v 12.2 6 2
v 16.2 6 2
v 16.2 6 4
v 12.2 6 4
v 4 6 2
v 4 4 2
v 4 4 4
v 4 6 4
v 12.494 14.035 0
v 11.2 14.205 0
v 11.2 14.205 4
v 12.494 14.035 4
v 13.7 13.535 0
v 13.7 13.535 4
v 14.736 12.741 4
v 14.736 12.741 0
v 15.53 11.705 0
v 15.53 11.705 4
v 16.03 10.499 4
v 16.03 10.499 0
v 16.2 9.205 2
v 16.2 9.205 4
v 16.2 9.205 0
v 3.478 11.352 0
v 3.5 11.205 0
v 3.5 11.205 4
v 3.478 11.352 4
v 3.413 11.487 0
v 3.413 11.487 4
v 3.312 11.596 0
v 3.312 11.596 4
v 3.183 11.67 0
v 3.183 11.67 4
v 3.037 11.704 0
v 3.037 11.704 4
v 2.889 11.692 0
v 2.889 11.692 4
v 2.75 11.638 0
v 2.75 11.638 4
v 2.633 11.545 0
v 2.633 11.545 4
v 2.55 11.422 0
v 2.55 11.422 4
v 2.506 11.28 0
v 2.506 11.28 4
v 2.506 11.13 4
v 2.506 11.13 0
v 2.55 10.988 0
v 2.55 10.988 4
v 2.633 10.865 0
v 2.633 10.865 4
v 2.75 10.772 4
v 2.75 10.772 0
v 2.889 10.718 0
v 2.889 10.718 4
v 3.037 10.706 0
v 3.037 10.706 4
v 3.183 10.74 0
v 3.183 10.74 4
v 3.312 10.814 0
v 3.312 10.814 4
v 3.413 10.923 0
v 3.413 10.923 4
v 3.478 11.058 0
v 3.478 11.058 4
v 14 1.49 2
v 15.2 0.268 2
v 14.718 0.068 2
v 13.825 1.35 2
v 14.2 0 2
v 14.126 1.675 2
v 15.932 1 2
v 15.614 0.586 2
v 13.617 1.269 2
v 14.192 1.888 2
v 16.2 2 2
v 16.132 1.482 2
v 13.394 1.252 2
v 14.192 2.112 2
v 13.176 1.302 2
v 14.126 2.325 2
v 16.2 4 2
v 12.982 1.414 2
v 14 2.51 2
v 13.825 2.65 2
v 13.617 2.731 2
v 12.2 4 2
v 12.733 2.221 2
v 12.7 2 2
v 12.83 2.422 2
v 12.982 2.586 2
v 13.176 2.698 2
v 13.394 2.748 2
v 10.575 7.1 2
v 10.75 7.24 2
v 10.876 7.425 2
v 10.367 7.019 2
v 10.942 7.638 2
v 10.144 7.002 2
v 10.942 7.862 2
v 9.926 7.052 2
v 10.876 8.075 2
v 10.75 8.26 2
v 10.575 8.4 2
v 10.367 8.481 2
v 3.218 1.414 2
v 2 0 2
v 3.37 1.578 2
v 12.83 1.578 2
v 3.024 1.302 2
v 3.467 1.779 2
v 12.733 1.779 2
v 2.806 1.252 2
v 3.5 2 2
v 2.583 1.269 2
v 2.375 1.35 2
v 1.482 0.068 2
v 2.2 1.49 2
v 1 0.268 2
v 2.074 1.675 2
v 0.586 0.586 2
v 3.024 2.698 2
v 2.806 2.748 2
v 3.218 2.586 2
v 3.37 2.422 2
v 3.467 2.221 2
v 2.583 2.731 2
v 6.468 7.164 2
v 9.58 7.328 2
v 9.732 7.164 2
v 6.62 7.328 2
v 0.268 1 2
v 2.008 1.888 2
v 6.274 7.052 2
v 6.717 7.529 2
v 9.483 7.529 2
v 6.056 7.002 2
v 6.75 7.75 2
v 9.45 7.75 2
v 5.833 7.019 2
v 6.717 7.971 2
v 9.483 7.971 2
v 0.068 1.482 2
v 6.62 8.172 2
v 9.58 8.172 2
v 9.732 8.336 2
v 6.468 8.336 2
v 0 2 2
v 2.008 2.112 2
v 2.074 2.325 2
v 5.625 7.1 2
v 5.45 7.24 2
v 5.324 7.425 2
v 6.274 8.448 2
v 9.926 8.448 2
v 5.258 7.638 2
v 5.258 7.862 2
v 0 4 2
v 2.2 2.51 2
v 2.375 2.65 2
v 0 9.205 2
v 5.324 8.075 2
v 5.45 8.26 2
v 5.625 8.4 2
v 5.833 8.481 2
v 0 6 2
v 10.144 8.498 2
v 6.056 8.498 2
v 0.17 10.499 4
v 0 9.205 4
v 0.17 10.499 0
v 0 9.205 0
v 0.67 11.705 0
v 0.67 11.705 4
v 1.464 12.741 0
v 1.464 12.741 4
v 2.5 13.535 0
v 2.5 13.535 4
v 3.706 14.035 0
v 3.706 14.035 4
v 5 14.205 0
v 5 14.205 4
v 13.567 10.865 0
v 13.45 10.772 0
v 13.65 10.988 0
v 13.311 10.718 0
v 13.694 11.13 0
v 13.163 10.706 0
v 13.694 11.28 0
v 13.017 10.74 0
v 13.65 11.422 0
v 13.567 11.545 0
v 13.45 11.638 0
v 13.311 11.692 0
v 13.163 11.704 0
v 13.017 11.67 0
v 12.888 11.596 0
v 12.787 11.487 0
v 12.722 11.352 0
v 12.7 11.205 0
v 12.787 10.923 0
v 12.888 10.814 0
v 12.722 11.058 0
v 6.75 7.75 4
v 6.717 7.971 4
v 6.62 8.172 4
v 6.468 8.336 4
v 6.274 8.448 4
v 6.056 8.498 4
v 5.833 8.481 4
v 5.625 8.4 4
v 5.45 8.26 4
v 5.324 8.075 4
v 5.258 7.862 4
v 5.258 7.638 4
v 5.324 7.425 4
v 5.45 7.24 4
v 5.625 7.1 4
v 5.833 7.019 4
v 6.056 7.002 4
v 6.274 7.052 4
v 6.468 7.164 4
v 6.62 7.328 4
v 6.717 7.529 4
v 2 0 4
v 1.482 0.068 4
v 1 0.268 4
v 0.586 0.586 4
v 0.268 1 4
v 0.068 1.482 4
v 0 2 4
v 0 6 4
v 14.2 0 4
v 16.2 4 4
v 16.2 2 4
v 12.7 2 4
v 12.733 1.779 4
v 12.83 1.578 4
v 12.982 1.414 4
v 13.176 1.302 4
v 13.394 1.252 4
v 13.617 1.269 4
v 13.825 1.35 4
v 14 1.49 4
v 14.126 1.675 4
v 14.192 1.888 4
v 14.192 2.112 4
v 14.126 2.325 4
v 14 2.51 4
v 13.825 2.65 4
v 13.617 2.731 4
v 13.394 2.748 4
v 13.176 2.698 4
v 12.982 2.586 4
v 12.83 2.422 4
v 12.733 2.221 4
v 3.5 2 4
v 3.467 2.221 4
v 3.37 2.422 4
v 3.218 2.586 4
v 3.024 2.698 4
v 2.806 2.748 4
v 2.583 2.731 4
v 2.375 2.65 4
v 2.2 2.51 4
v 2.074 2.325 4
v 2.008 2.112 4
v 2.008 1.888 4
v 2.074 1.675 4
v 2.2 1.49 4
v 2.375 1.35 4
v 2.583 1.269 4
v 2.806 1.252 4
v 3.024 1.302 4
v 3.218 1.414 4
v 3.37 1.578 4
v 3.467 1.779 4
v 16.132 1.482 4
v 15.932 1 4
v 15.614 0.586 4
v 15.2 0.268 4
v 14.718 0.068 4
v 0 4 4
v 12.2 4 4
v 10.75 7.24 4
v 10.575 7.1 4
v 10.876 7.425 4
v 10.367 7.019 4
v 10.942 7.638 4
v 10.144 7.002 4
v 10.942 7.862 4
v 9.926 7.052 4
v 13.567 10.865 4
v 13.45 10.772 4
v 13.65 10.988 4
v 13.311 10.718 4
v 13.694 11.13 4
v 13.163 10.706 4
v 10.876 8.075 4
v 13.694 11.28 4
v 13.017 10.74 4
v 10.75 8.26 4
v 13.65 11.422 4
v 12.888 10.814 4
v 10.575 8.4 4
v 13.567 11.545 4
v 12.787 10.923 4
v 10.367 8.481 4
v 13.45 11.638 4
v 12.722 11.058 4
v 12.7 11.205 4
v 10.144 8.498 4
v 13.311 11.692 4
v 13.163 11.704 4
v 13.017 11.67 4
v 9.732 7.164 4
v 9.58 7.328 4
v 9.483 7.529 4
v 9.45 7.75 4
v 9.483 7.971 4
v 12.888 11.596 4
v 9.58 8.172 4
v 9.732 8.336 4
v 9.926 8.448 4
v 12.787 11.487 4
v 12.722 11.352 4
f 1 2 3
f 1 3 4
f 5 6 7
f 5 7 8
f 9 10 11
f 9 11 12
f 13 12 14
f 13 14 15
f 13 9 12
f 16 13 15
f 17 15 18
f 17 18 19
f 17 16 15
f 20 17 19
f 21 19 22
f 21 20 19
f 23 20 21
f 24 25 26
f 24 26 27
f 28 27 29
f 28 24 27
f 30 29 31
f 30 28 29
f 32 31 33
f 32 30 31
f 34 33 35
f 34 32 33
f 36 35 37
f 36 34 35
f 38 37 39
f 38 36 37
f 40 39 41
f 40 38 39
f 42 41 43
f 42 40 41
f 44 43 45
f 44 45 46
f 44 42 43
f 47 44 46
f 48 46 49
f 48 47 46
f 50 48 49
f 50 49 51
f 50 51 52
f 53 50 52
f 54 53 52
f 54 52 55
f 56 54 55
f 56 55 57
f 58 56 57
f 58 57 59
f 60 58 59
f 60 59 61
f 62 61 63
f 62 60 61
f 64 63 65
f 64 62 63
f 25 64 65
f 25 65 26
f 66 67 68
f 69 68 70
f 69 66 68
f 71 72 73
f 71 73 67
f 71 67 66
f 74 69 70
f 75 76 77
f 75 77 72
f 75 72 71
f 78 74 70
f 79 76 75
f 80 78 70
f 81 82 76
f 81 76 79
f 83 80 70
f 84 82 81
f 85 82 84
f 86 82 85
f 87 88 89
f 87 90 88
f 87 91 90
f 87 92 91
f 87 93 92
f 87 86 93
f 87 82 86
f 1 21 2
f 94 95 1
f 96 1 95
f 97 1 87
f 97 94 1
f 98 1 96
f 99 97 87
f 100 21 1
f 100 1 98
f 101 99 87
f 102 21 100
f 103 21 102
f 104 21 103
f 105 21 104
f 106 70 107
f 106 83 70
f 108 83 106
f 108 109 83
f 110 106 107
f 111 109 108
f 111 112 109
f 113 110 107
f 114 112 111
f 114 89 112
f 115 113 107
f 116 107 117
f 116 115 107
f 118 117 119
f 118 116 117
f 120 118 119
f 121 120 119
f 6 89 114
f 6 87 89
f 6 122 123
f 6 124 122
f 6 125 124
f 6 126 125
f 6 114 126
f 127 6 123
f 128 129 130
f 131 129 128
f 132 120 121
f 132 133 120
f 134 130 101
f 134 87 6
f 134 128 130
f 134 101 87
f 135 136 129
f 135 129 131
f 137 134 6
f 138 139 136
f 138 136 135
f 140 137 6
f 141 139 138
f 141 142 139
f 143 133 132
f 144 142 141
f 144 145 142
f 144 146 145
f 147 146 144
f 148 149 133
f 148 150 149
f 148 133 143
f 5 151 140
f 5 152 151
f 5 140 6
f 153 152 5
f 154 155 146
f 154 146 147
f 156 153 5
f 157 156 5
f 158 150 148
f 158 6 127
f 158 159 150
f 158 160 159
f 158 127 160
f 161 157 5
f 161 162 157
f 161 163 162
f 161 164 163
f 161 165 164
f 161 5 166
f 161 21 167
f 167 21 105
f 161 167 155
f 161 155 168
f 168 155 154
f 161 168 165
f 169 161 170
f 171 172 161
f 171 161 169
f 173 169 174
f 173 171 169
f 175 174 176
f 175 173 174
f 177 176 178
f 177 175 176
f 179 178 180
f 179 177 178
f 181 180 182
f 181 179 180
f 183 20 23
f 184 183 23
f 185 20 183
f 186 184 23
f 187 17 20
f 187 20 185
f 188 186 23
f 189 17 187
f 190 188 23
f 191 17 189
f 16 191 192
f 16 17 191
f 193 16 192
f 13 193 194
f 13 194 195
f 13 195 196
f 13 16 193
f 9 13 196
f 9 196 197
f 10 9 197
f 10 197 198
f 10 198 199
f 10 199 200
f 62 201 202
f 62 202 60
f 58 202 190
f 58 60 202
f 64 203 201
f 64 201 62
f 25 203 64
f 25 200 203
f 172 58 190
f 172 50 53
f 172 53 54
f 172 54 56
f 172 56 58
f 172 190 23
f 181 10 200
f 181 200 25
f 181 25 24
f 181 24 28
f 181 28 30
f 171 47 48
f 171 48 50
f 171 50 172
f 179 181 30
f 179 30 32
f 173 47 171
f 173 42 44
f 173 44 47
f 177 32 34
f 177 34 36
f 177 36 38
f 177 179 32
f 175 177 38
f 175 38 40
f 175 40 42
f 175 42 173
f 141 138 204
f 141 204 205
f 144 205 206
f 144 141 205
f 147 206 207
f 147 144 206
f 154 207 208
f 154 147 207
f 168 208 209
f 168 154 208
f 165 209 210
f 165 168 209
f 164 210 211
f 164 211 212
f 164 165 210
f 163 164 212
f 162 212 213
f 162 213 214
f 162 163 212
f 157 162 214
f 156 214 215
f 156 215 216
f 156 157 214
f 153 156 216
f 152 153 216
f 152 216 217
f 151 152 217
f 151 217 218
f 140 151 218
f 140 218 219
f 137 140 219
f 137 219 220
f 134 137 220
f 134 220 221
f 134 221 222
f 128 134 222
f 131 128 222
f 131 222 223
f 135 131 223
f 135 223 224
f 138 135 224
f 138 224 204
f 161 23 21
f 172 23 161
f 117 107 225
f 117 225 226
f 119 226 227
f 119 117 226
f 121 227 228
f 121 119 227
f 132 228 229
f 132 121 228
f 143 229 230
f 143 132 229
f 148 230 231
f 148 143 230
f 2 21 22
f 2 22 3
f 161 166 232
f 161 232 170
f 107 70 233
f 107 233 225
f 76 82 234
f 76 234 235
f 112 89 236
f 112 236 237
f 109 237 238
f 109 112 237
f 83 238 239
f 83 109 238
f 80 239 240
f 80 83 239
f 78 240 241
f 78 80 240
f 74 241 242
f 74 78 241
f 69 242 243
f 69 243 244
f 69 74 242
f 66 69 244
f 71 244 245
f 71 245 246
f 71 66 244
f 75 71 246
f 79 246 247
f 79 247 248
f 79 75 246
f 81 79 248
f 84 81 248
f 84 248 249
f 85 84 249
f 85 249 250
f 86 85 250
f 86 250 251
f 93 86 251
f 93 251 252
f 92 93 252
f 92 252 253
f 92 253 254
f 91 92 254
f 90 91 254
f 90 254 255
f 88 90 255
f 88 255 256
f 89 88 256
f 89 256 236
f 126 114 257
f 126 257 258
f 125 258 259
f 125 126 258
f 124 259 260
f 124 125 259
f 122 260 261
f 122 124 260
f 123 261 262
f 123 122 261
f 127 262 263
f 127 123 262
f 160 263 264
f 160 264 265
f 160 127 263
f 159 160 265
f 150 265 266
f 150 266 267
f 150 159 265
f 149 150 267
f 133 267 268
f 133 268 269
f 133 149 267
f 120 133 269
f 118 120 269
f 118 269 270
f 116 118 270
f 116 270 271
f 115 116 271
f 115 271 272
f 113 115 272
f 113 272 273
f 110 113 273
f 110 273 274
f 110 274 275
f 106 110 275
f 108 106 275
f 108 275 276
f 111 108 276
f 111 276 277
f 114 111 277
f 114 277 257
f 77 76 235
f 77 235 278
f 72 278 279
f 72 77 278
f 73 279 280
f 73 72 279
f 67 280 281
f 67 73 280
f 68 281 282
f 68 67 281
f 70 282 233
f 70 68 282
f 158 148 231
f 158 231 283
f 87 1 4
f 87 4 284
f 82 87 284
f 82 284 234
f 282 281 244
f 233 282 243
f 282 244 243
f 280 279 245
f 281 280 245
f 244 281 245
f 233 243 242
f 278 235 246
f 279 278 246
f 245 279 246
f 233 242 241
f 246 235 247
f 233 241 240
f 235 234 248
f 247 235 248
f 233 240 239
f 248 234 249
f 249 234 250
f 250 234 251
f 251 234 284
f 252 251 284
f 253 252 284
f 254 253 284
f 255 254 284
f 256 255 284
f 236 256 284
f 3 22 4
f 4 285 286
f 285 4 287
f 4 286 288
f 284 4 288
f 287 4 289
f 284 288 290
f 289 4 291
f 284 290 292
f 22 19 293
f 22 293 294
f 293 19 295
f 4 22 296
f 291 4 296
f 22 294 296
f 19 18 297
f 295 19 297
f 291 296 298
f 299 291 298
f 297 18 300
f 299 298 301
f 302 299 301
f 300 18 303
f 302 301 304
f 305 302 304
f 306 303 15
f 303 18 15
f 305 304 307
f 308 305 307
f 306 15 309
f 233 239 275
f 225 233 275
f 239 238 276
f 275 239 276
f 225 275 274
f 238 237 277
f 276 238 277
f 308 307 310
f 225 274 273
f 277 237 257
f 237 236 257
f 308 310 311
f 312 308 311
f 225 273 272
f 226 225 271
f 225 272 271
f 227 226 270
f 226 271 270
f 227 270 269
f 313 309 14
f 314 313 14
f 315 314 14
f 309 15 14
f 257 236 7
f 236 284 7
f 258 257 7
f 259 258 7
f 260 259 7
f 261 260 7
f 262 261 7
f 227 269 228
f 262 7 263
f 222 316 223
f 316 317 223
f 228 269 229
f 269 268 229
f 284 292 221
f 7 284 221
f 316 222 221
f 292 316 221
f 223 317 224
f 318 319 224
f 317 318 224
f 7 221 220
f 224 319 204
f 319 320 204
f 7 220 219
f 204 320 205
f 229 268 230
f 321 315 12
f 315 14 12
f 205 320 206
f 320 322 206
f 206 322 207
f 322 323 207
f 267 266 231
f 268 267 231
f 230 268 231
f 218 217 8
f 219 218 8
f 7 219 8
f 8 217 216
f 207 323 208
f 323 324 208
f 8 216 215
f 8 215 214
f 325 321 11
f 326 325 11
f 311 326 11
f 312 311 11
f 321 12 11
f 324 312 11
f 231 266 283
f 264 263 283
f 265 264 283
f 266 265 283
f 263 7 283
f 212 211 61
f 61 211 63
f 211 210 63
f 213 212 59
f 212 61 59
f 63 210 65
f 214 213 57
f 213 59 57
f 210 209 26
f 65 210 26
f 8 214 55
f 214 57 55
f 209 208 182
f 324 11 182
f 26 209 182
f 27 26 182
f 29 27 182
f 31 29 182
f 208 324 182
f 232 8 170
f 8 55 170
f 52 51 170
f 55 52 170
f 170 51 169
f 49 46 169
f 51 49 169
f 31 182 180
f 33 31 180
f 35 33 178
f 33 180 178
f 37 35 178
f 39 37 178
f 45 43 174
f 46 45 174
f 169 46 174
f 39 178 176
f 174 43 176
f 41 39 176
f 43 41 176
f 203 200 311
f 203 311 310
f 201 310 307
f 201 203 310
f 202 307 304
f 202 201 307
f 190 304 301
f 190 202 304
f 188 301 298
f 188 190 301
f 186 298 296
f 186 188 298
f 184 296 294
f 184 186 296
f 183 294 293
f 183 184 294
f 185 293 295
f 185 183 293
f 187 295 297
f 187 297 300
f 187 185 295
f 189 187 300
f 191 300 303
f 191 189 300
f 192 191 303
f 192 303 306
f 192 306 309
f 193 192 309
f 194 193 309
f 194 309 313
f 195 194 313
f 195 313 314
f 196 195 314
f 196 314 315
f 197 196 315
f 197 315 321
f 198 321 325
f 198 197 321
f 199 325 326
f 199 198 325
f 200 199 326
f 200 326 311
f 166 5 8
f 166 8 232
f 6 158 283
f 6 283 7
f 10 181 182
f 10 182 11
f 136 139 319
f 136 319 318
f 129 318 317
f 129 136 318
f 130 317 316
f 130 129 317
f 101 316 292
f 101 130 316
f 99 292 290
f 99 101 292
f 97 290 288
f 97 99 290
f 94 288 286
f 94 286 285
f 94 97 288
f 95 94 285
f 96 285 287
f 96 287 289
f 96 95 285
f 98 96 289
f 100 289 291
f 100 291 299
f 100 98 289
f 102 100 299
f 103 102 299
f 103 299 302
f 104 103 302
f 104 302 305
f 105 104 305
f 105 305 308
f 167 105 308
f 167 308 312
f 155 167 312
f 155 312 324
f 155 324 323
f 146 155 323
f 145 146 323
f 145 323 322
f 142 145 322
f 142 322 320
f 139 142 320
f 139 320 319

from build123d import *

# Parameters (mm, degrees)
SKETCH1_R           = 0.75
SKETCH1_R_2         = 0.5
BOSS_EXTRUDE1_DEPTH = 4
SKETCH2_W           = 16.2
SKETCH2_H           = 9.205
CUT_EXTRUDE1_DEPTH  = 2


with BuildPart() as part:
    # Sketch1 → Boss-Extrude1 (new body)
    with BuildSketch(Plane.XY):
        with BuildLine():
            Line((12.2, 4), (16.2, 4))
            Line((16.2, 4), (16.2, 2))
            ThreePointArc((16.2, 2), (15.614213562, 0.585786438), (14.2, 0))
            Line((14.2, 0), (2, 0))
            ThreePointArc((2, 0), (0.585786438, 0.585786438), (0, 2))
            Line((0, 2), (0, 4))
            Line((0, 4), (4, 4))
            Line((4, 4), (4, 6))
            Line((4, 6), (0, 6))
            Line((0, 6), (0, 9.205))
            ThreePointArc((0, 9.205), (1.464466094, 12.740533906), (5, 14.205))
            Line((5, 14.205), (11.2, 14.205))
            ThreePointArc((11.2, 14.205), (14.735533906, 12.740533906), (16.2, 9.205))
            Line((16.2, 9.205), (16.2, 6))
            Line((16.2, 6), (12.2, 6))
            Line((12.2, 6), (12.2, 4))
        make_face()
        with Locations((13.45, 2)):
            Circle(SKETCH1_R, mode=Mode.SUBTRACT)
        with Locations((13.2, 11.205)):
            Circle(SKETCH1_R_2, mode=Mode.SUBTRACT)
        with Locations((10.2, 7.75)):
            Circle(SKETCH1_R, mode=Mode.SUBTRACT)
        with Locations((6, 7.75)):
            Circle(SKETCH1_R, mode=Mode.SUBTRACT)
        with Locations((3, 11.205)):
            Circle(SKETCH1_R_2, mode=Mode.SUBTRACT)
        with Locations((2.75, 2)):
            Circle(SKETCH1_R, mode=Mode.SUBTRACT)
    extrude(amount=BOSS_EXTRUDE1_DEPTH)

    # Sketch2 → Cut-Extrude1 (cut)
    with BuildSketch(Plane(origin=(0, 0, 0), x_dir=(-1, 0, 0), z_dir=(0, 0, -1))):
        with Locations((-8.1, 4.6025)):
            Rectangle(SKETCH2_W, SKETCH2_H)
    extrude(amount=-CUT_EXTRUDE1_DEPTH, mode=Mode.SUBTRACT)


solid = part.part
